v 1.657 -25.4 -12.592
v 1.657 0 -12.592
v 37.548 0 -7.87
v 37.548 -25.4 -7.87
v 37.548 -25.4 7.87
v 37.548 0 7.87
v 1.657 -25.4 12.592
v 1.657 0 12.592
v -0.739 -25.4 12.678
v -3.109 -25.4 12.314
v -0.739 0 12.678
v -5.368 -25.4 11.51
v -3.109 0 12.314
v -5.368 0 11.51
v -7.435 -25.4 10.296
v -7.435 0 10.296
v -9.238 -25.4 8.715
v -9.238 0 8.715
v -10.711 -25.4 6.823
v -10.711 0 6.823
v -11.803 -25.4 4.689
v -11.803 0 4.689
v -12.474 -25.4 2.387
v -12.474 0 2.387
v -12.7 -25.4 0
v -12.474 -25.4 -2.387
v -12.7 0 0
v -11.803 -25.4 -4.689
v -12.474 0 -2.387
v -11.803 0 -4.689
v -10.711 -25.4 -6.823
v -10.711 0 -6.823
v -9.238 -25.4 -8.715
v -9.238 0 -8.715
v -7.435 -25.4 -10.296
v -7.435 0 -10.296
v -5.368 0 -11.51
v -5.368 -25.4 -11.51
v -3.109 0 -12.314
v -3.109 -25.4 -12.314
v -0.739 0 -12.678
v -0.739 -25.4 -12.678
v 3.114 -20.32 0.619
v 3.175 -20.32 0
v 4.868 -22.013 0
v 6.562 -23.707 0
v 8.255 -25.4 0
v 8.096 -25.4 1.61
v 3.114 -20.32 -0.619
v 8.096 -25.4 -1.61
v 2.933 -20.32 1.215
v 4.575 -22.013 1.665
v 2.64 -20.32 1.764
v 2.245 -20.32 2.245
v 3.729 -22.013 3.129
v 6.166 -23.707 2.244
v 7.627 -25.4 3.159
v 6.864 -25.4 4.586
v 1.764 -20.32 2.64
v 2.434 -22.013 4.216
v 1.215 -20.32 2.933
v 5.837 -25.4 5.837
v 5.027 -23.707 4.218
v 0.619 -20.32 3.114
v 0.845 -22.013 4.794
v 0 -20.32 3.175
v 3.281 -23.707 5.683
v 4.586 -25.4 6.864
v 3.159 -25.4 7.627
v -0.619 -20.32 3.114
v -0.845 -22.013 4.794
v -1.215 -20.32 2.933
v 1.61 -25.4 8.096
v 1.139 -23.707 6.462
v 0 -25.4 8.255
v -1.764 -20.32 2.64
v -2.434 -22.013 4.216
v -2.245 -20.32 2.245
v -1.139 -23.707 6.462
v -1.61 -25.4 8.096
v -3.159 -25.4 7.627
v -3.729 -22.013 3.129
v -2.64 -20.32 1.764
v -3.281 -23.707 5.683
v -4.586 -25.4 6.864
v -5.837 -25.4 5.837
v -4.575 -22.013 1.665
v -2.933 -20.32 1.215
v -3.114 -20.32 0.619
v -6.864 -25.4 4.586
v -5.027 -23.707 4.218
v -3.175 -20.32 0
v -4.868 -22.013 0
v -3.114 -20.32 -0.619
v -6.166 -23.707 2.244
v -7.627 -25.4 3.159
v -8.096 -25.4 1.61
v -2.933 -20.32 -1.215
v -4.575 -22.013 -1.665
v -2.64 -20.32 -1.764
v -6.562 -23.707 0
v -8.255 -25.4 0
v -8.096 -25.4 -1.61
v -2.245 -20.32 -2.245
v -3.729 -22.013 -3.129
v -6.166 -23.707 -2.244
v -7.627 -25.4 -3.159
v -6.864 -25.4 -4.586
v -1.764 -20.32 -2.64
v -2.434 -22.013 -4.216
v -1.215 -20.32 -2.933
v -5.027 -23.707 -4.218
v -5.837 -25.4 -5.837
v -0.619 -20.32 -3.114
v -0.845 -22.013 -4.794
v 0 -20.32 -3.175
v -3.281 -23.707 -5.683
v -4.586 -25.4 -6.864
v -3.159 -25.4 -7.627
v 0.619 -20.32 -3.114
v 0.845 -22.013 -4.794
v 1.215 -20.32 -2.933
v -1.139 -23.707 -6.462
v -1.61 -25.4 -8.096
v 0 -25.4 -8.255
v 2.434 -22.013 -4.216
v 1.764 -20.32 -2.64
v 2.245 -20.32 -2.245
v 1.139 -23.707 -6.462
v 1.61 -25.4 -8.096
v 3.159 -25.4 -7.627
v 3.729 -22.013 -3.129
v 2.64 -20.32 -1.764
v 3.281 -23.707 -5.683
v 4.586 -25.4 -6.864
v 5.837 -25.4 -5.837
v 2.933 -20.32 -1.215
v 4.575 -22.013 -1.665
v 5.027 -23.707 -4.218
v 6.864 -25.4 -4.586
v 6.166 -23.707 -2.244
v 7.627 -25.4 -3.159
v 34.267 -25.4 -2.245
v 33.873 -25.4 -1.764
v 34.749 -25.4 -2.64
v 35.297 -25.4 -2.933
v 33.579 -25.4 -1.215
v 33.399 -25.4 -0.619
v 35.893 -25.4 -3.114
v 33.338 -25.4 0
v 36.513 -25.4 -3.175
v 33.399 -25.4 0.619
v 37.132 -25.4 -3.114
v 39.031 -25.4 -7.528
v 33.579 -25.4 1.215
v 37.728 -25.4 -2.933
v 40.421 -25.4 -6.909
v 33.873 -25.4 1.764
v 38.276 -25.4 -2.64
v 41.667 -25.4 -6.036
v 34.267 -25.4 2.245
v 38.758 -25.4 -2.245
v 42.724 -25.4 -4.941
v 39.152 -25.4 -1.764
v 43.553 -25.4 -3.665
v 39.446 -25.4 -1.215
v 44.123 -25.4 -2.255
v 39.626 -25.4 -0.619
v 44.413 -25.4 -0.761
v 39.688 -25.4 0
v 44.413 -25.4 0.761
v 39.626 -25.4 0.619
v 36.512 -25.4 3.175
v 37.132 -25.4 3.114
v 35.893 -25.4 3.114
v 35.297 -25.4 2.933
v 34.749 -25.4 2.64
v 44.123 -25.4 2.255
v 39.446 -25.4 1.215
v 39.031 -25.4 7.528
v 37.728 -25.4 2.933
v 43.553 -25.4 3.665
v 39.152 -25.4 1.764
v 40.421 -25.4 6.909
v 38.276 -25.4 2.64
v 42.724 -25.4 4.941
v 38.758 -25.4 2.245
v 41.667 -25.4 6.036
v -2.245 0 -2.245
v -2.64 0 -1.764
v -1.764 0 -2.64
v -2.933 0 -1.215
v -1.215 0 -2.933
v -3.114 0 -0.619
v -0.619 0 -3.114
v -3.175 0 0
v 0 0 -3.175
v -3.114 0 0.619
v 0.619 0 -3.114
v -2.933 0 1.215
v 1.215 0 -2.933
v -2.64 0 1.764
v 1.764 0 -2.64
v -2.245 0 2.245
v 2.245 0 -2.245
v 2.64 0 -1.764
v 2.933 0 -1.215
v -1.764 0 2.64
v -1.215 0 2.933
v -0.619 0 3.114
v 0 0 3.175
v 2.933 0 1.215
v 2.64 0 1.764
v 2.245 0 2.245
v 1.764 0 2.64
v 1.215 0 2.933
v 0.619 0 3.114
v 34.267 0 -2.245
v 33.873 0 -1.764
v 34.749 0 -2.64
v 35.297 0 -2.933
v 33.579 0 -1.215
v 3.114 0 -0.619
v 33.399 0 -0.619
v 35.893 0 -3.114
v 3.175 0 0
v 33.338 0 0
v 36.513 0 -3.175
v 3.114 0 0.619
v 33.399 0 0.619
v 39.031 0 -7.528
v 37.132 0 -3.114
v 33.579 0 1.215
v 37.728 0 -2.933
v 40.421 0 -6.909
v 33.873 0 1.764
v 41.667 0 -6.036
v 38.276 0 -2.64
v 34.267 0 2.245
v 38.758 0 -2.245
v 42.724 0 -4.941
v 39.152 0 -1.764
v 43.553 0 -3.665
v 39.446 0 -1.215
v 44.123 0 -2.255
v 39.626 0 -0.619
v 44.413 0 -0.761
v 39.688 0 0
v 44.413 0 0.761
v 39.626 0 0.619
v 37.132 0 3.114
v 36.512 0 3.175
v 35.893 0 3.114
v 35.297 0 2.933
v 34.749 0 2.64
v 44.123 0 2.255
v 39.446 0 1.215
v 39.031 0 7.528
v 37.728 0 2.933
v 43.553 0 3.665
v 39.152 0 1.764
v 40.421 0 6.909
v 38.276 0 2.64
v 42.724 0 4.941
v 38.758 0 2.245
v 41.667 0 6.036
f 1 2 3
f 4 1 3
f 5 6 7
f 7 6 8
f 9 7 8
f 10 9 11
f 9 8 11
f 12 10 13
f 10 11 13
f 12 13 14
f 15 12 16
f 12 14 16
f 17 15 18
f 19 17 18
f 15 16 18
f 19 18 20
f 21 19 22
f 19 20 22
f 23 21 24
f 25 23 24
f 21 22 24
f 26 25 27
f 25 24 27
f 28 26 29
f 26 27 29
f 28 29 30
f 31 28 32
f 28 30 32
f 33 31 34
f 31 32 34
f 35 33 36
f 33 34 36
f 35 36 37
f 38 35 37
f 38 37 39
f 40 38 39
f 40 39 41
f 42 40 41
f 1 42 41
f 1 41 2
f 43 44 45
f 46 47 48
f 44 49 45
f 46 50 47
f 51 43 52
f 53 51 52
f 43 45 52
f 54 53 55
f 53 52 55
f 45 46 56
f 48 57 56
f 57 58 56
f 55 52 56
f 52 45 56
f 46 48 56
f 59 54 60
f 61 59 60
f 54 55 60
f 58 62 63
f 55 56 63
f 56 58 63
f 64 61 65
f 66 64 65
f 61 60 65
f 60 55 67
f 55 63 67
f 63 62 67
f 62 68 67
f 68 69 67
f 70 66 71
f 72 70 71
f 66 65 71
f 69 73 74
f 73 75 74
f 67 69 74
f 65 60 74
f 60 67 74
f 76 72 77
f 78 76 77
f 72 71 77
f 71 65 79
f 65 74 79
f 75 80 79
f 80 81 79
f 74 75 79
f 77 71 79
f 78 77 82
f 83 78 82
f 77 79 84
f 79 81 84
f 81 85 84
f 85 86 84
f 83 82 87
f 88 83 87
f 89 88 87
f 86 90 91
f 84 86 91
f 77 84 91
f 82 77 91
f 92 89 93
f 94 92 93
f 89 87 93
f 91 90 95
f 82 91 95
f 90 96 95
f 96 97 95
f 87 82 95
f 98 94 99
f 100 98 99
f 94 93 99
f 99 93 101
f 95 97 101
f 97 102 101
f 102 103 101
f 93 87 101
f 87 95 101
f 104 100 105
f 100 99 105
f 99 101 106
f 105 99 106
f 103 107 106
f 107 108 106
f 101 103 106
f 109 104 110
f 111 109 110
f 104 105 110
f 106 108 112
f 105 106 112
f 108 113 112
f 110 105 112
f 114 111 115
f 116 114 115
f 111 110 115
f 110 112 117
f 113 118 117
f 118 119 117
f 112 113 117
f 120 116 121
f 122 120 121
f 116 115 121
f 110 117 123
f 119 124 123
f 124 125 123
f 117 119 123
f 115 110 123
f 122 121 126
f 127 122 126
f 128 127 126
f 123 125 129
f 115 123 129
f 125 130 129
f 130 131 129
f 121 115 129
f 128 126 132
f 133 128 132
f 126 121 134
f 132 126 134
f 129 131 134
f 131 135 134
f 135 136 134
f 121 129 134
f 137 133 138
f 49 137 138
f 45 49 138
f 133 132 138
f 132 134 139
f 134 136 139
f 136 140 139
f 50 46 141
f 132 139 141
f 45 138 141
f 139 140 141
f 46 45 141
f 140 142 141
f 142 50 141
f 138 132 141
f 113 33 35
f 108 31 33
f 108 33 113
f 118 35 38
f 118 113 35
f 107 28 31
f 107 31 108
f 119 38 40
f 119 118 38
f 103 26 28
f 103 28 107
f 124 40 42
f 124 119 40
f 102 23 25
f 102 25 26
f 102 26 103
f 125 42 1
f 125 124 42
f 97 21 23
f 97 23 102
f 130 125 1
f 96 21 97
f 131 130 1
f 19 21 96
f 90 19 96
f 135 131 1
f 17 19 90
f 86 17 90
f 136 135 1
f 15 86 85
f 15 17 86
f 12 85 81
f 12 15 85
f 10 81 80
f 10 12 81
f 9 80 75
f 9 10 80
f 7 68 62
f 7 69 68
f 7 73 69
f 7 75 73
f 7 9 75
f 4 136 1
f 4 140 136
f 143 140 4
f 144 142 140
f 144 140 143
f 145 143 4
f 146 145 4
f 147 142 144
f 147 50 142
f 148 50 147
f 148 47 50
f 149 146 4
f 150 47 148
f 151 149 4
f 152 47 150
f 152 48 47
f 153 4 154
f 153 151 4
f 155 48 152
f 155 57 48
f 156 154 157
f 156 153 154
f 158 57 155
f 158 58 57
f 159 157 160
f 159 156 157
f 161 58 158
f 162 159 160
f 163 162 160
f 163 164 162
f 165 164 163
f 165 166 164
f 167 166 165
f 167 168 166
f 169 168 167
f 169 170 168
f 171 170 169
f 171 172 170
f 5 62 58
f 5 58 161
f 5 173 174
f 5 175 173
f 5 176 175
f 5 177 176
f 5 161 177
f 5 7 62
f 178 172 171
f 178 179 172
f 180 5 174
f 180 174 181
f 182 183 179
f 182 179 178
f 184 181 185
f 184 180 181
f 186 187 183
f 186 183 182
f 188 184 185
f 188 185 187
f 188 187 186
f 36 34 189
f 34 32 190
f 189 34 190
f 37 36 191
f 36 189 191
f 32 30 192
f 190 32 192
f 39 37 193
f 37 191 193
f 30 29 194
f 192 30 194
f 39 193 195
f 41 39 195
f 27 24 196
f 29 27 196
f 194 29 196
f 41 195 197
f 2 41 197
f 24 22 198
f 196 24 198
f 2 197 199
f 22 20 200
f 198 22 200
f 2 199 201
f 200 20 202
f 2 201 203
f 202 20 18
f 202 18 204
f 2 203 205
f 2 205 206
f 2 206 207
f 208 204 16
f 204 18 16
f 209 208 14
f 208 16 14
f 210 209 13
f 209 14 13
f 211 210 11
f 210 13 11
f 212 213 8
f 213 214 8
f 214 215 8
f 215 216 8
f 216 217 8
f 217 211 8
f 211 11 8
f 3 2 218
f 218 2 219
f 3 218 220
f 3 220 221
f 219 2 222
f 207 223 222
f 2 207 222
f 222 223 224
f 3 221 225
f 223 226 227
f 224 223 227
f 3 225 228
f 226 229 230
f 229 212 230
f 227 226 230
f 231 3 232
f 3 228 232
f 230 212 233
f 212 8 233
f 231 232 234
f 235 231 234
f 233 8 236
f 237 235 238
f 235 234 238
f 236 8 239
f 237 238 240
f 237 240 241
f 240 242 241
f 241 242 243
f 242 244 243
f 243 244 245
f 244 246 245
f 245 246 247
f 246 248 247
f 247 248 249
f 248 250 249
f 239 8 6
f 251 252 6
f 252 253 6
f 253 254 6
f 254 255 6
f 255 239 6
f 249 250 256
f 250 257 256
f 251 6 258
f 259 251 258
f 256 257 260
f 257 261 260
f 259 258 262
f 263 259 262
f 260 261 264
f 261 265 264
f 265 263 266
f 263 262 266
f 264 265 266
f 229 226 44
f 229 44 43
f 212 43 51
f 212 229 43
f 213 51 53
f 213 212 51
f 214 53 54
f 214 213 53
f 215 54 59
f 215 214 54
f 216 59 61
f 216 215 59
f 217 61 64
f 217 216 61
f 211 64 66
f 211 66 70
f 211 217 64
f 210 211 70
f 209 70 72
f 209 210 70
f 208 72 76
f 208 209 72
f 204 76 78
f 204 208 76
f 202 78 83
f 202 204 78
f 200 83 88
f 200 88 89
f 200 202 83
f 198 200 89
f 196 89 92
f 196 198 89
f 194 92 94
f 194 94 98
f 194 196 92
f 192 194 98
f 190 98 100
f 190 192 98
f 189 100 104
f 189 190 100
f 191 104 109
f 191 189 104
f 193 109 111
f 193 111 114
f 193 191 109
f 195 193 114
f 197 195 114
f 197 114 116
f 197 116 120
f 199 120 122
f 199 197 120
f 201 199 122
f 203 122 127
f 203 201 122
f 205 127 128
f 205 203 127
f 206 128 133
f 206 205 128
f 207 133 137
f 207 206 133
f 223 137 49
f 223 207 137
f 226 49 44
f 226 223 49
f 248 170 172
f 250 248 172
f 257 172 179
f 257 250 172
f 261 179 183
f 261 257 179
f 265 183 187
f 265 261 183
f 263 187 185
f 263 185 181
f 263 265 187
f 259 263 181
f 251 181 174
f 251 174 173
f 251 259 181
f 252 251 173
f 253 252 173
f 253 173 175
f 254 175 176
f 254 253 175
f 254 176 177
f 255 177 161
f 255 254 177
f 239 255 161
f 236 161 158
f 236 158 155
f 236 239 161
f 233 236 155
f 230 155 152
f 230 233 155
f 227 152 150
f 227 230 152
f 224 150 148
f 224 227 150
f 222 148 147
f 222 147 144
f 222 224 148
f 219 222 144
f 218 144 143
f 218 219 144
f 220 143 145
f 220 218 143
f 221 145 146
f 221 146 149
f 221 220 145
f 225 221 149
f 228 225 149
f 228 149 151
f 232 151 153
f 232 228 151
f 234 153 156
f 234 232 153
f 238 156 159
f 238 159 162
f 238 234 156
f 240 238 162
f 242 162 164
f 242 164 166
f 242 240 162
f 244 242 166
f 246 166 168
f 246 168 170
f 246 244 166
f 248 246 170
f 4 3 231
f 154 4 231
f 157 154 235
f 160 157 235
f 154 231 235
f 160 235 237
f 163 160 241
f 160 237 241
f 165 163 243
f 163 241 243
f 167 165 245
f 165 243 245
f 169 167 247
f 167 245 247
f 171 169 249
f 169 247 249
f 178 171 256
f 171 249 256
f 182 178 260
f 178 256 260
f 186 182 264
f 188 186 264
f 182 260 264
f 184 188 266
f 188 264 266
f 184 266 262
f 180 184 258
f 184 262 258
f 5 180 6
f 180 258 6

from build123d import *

# Parameters (mm, degrees)
F0_W     = 93.4863612056
F0_H     = 177.5486841798
F0_R     = 7.3874991458
F1_DEPTH = 25.4
F5_R     = 3.175
F6_DEPTH = 25.4
F7_SIZE  = 5.08


# Not quite as in the source:
# - a feature names something its author has since deleted; it is built from what else it names
# - the program builds the solid bodies; features that only make, move or delete a surface that nothing else refers to are left out


with BuildPart() as f1:
    # F0 (on Front) → F1 (new body)
    with BuildSketch(Plane.XZ):
        with Locations((0.2827197313, -1.319359988)):
            Rectangle(F0_W, F0_H)
        Circle(F0_R, mode=Mode.SUBTRACT)
    extrude(amount=F1_DEPTH)


with BuildPart() as f6:
    # F5 (on Front) → F6 (new body)
    with BuildSketch(Plane.XZ):
        with BuildLine():
            ThreePointArc((1.6565217391, -12.5915025207), (9.5479795268, -8.3741320121), (12.7, 0))
            ThreePointArc((12.7, 0), (9.5479795268, 8.3741320121), (1.6565217391, 12.5915025207))
            ThreePointArc((1.6565217391, 12.5915025207), (-12.7, 0), (1.6565217391, -12.5915025207))
        make_face()
        Circle(F5_R, mode=Mode.SUBTRACT)
        with BuildLine():
            ThreePointArc((1.6565217391, 12.5915025207), (9.5479795268, 8.3741320121), (12.7, 0))
            ThreePointArc((12.7, 0), (9.5479795268, -8.3741320121), (1.6565217391, -12.5915025207))
            Line((1.6565217391, -12.5915025207), (37.547826087, -7.8696890754))
            ThreePointArc((37.547826087, -7.8696890754), (28.575, 0), (37.547826087, 7.8696890754))
            Line((37.547826087, 7.8696890754), (1.6565217391, 12.5915025207))
        make_face()
        with BuildLine():
            ThreePointArc((44.45, 0), (42.4799872042, 5.2338325076), (37.547826087, 7.8696890754))
            ThreePointArc((37.547826087, 7.8696890754), (28.575, 0), (37.547826087, -7.8696890754))
            ThreePointArc((37.547826087, -7.8696890754), (42.4799872042, -5.2338325076), (44.45, 0))
        make_face()
        with Locations((36.5125, 0)):
            Circle(F5_R, mode=Mode.SUBTRACT)
    extrude(amount=F6_DEPTH)

    # F7
    f7_edges = [f6.edges().sort_by_distance(p)[0] for p in [
        (-3.175, -25.4, 0),
    ]]
    chamfer(f7_edges, length=F7_SIZE)


solid = f6.part
